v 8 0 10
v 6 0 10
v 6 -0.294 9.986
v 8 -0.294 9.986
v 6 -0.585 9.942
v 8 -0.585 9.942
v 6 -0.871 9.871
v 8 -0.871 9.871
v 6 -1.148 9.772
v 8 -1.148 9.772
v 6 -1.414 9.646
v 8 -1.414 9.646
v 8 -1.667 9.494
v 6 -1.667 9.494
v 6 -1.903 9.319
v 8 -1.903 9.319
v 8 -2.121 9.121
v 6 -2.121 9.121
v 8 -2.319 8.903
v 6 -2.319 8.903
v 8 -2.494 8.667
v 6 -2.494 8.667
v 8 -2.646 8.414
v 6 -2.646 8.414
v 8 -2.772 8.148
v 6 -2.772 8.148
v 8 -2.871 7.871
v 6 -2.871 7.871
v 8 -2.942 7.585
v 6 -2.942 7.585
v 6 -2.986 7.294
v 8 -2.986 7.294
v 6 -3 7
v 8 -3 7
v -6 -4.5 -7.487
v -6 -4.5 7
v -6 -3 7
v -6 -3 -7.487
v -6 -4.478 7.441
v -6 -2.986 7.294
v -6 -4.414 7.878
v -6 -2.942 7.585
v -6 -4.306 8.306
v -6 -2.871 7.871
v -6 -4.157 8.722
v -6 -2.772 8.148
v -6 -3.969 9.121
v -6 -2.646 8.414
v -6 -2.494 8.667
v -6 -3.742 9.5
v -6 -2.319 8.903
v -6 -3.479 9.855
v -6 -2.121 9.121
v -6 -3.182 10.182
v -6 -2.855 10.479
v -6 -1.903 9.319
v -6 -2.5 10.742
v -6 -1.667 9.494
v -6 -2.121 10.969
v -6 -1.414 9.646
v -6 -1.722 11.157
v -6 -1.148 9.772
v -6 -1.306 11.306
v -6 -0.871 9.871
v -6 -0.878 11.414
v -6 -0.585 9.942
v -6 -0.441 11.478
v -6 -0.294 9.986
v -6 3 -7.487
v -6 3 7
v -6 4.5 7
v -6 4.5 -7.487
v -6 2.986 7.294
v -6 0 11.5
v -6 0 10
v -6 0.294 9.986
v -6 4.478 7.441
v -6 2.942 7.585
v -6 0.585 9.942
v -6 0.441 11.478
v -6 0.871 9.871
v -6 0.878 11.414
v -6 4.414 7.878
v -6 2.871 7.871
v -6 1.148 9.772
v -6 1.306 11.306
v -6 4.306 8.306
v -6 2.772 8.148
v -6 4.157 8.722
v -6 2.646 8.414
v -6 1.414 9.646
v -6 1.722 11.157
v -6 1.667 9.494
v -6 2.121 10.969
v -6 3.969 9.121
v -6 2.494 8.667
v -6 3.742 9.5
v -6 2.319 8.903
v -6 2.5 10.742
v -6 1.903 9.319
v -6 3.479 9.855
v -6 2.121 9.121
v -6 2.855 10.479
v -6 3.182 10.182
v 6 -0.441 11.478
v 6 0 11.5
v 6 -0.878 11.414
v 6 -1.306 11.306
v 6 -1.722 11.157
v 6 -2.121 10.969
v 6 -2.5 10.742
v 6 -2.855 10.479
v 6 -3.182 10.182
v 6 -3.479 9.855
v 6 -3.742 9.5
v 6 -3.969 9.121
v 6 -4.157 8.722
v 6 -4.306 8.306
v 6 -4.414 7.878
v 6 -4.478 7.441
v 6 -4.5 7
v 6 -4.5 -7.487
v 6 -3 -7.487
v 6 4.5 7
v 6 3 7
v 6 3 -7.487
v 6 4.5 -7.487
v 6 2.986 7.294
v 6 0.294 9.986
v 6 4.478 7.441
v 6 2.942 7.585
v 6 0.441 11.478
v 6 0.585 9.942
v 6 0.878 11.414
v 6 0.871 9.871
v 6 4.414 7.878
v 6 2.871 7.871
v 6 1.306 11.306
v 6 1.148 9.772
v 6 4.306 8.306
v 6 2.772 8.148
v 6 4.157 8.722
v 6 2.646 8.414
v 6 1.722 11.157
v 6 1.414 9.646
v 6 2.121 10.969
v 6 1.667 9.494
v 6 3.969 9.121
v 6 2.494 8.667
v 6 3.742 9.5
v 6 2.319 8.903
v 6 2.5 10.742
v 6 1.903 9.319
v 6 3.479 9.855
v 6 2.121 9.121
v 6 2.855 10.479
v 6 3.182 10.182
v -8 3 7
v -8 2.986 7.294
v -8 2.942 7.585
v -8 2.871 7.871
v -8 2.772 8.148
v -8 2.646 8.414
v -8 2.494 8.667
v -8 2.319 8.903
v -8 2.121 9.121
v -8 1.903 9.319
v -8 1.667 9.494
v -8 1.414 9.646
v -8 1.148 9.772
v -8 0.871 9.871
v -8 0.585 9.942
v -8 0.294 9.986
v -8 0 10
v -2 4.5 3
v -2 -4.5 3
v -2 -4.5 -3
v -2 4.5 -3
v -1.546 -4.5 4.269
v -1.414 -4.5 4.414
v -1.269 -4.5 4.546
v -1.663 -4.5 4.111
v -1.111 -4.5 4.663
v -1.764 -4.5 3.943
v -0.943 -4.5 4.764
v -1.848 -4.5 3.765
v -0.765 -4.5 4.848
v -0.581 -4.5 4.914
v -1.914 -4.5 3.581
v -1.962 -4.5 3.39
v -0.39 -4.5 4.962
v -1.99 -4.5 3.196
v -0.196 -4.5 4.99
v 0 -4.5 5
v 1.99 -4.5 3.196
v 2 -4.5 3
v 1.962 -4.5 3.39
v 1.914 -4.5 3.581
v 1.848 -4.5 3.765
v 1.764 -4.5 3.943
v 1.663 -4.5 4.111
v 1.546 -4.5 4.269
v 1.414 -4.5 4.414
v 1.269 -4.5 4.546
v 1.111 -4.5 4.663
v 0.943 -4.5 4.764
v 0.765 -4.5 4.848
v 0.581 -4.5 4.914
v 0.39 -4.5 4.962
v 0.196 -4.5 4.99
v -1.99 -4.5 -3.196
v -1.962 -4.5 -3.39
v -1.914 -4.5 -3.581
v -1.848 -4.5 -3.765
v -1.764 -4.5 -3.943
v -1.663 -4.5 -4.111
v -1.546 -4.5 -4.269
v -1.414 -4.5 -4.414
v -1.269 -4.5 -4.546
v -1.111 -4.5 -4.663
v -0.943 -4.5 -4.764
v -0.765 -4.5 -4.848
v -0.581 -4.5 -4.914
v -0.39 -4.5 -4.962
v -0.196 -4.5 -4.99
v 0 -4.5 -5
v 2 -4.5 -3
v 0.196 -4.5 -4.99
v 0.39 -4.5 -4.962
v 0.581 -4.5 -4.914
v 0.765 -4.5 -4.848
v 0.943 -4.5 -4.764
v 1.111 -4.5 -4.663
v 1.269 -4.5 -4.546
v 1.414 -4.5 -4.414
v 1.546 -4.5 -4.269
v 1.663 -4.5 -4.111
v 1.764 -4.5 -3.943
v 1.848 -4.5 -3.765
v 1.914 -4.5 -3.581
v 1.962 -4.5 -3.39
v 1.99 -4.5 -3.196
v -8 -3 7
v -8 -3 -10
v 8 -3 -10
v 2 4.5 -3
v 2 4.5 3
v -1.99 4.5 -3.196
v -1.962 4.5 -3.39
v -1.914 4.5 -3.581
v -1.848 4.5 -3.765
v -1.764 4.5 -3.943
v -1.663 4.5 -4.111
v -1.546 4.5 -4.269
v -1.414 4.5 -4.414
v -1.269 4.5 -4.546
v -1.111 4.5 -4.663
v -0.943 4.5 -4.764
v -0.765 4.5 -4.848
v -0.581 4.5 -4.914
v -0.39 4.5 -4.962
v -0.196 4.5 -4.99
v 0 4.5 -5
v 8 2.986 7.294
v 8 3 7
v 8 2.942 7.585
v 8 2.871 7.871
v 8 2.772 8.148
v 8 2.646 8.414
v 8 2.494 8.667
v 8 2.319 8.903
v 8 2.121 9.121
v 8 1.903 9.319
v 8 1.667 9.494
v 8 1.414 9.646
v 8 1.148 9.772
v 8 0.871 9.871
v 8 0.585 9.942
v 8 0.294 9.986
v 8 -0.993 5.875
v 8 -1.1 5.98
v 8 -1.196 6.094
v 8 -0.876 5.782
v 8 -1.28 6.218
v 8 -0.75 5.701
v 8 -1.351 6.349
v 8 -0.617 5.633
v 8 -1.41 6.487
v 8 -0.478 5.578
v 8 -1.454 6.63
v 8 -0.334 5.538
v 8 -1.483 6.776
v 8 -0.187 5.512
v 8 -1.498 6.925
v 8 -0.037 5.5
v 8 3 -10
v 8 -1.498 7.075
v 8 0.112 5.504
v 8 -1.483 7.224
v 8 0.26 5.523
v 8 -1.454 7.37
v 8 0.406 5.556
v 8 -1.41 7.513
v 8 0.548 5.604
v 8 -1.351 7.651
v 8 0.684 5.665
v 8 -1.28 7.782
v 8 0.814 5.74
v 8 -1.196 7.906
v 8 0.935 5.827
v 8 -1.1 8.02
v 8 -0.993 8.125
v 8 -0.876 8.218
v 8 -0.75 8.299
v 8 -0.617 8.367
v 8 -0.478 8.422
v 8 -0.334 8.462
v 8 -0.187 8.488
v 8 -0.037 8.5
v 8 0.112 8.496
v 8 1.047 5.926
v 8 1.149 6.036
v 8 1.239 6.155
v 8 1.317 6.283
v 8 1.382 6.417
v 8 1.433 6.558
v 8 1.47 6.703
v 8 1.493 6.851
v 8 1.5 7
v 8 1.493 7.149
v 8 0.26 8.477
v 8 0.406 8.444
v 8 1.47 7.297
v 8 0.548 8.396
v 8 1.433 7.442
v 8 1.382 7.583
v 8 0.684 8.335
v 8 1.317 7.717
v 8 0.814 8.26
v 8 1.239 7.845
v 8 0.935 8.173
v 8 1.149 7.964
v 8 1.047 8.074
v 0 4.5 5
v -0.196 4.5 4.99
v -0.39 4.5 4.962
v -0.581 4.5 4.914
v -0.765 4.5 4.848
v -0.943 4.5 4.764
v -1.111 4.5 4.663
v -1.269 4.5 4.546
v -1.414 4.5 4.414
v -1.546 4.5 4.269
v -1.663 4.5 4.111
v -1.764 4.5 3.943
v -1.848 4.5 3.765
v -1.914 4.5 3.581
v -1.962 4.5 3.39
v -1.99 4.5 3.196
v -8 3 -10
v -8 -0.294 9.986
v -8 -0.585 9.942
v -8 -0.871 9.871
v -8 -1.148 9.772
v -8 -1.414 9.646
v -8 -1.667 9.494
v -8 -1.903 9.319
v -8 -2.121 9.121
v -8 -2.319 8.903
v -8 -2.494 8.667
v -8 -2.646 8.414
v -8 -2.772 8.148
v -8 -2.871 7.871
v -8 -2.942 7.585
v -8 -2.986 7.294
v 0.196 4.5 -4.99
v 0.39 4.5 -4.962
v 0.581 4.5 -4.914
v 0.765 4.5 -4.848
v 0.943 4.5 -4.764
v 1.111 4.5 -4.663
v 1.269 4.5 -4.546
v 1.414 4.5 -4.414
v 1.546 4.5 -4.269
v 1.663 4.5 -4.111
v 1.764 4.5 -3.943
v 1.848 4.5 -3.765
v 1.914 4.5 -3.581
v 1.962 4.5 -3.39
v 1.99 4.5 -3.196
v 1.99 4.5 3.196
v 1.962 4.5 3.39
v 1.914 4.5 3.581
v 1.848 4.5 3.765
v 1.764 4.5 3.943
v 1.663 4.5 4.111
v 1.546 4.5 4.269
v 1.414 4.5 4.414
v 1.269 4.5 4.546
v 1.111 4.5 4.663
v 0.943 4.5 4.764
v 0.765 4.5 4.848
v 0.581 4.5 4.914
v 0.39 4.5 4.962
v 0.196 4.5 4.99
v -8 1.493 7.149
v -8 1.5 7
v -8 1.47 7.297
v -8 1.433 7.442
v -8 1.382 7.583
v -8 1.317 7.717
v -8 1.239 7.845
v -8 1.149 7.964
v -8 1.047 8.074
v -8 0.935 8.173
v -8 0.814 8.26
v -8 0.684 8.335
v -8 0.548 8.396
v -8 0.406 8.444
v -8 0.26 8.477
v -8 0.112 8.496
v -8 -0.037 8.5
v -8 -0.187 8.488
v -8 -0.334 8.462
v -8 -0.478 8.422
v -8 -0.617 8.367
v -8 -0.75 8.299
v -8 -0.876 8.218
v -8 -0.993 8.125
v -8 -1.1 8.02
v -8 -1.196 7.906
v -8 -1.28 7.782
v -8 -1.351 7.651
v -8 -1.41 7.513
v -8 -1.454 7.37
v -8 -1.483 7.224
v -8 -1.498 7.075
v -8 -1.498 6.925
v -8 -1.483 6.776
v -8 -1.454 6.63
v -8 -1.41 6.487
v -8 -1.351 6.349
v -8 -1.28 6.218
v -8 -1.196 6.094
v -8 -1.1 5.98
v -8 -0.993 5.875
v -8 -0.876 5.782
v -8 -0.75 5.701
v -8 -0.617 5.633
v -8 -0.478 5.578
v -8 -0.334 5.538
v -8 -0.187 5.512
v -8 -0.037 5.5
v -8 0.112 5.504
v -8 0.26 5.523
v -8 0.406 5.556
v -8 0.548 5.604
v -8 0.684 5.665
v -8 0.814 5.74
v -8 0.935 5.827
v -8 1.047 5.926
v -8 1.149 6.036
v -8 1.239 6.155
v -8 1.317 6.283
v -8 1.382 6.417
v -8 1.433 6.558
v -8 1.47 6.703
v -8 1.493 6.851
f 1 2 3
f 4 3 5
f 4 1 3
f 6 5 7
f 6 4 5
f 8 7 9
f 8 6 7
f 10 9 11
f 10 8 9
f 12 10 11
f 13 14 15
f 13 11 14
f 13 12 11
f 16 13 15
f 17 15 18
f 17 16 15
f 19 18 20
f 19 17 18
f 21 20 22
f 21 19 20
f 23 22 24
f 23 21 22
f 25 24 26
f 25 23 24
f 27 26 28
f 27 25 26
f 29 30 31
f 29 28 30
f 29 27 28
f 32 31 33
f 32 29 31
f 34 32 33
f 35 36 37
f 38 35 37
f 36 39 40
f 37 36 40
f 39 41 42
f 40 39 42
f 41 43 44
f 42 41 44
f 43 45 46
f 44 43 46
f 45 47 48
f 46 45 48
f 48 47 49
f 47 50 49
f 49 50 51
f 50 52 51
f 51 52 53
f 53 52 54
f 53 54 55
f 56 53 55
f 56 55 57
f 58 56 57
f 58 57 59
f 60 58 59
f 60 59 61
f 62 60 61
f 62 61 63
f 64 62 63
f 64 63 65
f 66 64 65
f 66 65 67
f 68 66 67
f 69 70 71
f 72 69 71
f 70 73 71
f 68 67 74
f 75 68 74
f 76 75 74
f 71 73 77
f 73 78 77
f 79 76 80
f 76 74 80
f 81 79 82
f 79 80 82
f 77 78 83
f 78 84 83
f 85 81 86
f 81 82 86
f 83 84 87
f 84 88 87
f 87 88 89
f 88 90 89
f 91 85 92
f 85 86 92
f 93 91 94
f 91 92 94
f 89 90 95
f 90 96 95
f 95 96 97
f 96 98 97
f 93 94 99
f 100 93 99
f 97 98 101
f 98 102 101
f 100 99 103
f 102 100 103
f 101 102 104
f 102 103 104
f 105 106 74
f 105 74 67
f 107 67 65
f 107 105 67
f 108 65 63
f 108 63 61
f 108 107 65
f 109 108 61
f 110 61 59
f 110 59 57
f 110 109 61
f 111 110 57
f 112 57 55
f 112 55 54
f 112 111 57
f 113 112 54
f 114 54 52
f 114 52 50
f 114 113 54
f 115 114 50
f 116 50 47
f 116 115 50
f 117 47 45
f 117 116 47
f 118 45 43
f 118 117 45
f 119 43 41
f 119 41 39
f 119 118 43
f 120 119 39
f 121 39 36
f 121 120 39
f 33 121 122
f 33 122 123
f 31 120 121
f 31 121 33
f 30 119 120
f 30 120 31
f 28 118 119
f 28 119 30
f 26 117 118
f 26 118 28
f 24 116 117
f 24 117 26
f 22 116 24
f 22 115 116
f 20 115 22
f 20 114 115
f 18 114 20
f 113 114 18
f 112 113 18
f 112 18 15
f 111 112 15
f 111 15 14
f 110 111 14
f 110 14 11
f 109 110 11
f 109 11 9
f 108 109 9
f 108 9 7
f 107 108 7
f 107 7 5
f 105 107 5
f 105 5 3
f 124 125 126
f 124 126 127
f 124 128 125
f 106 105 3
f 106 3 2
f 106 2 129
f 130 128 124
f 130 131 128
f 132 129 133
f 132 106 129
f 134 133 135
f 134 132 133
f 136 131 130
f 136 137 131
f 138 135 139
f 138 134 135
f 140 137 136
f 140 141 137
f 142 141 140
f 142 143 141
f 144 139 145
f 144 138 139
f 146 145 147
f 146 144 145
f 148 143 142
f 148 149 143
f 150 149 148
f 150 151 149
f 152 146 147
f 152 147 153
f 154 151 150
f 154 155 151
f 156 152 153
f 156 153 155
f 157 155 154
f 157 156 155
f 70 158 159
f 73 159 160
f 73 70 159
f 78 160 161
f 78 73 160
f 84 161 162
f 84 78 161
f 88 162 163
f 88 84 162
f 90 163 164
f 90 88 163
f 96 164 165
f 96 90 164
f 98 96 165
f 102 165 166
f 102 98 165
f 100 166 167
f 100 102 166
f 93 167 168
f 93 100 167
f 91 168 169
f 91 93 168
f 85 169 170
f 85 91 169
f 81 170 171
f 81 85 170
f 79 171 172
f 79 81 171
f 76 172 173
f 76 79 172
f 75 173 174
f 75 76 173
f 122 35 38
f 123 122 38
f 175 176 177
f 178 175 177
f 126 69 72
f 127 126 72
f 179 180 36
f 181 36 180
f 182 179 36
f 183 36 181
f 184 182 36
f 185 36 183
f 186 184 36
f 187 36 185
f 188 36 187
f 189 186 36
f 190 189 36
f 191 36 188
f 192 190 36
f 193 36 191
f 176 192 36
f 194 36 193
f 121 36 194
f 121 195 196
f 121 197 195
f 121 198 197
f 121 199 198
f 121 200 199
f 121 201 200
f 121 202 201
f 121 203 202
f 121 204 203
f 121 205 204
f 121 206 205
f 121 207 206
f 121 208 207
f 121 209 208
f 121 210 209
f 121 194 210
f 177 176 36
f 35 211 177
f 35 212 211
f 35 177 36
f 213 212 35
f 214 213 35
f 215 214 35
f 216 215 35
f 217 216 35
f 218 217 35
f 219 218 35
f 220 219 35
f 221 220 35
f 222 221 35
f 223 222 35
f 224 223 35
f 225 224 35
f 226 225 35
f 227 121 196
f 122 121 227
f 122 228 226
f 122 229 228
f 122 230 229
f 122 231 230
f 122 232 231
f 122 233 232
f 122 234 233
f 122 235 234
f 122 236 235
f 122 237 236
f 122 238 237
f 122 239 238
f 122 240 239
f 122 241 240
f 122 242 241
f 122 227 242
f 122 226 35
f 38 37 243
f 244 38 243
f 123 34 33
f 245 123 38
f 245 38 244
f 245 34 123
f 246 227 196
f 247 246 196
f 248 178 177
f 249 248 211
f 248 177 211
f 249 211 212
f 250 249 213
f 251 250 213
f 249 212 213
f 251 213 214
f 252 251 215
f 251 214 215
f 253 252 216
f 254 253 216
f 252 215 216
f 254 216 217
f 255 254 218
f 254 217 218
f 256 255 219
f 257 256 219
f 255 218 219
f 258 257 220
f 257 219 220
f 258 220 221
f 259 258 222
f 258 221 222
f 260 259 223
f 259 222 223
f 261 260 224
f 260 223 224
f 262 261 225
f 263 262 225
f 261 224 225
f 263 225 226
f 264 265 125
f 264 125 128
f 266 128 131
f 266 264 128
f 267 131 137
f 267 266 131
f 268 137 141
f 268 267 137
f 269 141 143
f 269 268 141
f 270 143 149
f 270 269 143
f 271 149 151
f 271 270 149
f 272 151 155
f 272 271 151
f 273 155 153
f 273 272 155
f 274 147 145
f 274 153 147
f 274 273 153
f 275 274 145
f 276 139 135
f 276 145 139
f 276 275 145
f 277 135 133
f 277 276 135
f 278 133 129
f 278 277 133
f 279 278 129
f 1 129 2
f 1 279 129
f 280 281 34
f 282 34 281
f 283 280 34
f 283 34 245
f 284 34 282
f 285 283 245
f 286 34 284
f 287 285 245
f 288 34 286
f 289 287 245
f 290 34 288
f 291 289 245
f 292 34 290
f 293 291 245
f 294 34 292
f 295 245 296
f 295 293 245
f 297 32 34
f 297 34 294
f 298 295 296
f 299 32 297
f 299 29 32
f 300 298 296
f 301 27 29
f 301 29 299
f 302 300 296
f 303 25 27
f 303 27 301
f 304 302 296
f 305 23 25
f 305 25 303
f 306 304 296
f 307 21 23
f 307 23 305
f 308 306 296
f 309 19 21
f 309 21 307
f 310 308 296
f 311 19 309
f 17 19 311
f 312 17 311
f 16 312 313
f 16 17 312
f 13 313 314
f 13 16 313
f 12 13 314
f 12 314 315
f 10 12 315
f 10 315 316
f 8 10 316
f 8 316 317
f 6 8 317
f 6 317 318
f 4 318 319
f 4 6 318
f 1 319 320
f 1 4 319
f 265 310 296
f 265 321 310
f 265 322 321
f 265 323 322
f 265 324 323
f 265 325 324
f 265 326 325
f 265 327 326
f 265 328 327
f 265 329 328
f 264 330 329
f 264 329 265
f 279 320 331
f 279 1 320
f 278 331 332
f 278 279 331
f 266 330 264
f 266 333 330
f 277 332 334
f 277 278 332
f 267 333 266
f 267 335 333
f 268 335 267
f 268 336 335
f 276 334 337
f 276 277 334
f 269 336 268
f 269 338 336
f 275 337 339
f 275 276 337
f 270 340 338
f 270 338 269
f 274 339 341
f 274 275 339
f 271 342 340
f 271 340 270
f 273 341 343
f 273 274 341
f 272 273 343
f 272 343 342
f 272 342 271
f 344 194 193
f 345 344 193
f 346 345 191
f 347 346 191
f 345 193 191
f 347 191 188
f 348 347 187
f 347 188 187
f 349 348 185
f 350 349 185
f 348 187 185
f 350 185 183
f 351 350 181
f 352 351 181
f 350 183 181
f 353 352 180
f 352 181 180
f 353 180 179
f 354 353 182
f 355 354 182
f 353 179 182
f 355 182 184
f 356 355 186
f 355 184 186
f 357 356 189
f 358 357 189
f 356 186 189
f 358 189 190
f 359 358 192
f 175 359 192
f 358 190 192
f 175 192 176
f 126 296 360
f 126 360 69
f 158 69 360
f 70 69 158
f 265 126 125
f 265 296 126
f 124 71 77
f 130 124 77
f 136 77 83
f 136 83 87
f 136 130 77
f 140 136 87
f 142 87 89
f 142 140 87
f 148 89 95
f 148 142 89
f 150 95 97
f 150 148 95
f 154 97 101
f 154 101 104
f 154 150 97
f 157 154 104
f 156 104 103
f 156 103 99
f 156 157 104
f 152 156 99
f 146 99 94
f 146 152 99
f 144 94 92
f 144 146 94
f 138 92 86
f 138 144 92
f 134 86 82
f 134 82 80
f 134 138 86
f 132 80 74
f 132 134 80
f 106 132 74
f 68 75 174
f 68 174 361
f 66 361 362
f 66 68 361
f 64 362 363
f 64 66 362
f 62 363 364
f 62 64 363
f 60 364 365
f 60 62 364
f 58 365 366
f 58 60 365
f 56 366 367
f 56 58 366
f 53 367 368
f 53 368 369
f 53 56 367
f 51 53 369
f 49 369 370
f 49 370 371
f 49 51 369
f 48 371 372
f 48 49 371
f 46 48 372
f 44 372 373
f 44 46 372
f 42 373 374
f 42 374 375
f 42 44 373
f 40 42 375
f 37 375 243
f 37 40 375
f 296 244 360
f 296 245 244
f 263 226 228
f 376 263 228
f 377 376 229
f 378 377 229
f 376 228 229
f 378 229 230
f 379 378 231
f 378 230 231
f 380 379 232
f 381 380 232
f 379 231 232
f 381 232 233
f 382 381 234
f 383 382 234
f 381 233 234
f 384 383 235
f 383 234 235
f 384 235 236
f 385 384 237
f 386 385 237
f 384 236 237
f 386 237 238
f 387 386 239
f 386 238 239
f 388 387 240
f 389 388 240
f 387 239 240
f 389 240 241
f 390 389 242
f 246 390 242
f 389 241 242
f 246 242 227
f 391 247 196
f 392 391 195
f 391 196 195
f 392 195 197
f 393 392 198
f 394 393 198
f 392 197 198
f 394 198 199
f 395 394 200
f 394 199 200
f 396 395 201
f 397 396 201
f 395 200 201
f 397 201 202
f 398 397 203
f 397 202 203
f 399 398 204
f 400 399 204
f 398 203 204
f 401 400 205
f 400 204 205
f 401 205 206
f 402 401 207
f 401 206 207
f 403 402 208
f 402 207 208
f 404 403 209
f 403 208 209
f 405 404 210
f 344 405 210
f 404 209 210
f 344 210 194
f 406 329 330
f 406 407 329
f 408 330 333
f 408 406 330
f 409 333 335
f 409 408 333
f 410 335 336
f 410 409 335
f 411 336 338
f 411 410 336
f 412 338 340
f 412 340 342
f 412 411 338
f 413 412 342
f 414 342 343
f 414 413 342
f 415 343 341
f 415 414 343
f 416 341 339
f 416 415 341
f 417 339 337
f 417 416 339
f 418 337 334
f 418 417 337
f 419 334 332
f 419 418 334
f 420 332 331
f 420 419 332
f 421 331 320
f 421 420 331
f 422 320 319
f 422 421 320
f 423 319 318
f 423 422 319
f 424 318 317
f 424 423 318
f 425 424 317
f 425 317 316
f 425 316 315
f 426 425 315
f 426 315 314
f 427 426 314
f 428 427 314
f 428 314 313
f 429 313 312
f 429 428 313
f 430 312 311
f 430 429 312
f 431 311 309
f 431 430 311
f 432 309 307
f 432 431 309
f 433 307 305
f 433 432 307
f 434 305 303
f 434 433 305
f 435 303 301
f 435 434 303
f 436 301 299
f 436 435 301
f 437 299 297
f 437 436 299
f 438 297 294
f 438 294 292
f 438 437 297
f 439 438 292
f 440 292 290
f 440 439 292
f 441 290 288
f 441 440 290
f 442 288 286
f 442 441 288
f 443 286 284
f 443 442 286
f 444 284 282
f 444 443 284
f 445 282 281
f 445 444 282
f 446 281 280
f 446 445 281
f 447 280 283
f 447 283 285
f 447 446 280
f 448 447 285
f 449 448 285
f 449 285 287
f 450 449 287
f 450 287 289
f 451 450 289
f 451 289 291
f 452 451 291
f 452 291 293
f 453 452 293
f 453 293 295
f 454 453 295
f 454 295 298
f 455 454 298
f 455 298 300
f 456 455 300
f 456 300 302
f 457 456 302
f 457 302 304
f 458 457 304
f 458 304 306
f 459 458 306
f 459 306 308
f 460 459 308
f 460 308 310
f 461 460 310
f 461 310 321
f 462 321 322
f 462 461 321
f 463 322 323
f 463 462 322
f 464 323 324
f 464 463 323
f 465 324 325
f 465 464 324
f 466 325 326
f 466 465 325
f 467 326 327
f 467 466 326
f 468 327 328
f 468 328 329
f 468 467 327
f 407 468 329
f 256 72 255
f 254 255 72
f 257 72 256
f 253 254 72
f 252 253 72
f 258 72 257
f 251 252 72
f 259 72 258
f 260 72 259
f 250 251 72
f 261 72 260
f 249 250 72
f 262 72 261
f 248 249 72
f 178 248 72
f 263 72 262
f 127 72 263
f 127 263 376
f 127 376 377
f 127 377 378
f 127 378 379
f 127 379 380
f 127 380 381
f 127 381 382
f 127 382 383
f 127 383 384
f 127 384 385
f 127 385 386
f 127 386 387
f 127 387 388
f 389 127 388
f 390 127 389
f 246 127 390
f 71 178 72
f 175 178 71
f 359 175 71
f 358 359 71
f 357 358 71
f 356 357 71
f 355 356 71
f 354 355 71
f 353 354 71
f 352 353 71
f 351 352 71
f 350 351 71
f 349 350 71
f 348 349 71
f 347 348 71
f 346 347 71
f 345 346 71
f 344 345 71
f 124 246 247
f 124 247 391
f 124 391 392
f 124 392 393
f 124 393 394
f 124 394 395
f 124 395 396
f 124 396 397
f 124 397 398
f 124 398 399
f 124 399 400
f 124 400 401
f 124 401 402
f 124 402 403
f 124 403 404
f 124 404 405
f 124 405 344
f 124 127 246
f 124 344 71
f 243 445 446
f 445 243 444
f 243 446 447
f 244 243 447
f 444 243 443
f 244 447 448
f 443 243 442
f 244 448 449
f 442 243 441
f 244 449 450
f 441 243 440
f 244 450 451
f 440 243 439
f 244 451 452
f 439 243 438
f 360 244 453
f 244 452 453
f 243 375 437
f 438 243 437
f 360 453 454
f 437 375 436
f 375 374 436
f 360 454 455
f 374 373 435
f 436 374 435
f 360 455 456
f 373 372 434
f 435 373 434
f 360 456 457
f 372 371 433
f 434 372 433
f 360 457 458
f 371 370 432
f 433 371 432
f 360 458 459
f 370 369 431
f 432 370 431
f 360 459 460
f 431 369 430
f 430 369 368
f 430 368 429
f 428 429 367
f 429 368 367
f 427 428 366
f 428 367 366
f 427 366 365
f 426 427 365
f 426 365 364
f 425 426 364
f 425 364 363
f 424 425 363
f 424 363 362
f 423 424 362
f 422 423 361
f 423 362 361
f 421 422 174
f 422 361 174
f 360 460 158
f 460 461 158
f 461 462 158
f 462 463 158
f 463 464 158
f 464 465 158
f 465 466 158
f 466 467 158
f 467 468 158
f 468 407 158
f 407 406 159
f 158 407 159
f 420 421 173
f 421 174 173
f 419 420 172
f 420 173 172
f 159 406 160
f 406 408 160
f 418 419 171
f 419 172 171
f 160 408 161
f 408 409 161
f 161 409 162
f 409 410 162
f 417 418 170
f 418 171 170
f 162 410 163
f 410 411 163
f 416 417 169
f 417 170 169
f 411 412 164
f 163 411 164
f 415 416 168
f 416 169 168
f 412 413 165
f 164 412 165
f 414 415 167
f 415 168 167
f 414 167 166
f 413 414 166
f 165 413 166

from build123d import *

# Parameters (mm, degrees)
F0_R          = 1.5
F1_DEPTH      = 8
F1_DEPTH_BACK = 8
F2_DEPTH      = 6
F2_DEPTH_BACK = 6
F4_DEPTH      = 25


with BuildPart() as f1:
    # F0 (on Right) → F1 (new body, two sides)
    with BuildSketch(Plane.YZ) as f1_sk:
        with BuildLine():
            Line((-3, -10), (3, -10))
            Line((3, -10), (3, -7.486621))
            Line((3, -7.486621), (3, 7))
            ThreePointArc((3, 7), (2.12132, 9.12132), (0, 10))
            ThreePointArc((0, 10), (-2.12132, 9.12132), (-3, 7))
            Line((-3, 7), (-3, -7.486621))
            Line((-3, -7.486621), (-3, -10))
        make_face()
        with Locations((0, 7)):
            Circle(F0_R, mode=Mode.SUBTRACT)
    extrude(amount=F1_DEPTH)
    extrude(f1_sk.sketch, amount=-F1_DEPTH_BACK)

    # F0 (on Right) → F2 (join, two sides)
    with BuildSketch(Plane.YZ) as f2_sk:
        with BuildLine():
            Line((3, 7), (3, -7.486621))
            Line((3, -7.486621), (4.5, -7.486621))
            Line((4.5, -7.486621), (4.5, 7))
            ThreePointArc((4.5, 7), (3.181981, 10.181981), (0, 11.5))
            ThreePointArc((0, 11.5), (-3.181981, 10.181981), (-4.5, 7))
            Line((-4.5, 7), (-4.5, -7.486621))
            Line((-4.5, -7.486621), (-3, -7.486621))
            Line((-3, -7.486621), (-3, 7))
            ThreePointArc((-3, 7), (-2.12132, 9.12132), (0, 10))
            ThreePointArc((0, 10), (2.12132, 9.12132), (3, 7))
        make_face()
    extrude(amount=F2_DEPTH)
    extrude(f2_sk.sketch, amount=-F2_DEPTH_BACK)

    # F3 (on face) → F4 (cut)
    with BuildSketch(Plane.XZ.offset(4.5)):
        with BuildLine():
            Line((2, -3), (2, 3))
            ThreePointArc((2, 3), (1.414214, 4.414214), (0, 5))
            ThreePointArc((0, 5), (-1.414214, 4.414214), (-2, 3))
            Line((-2, 3), (-2, -3))
            ThreePointArc((-2, -3), (-1.414214, -4.414214), (0, -5))
            ThreePointArc((0, -5), (1.414214, -4.414214), (2, -3))
        make_face()
    extrude(amount=-F4_DEPTH, mode=Mode.SUBTRACT)


solid = f1.part
